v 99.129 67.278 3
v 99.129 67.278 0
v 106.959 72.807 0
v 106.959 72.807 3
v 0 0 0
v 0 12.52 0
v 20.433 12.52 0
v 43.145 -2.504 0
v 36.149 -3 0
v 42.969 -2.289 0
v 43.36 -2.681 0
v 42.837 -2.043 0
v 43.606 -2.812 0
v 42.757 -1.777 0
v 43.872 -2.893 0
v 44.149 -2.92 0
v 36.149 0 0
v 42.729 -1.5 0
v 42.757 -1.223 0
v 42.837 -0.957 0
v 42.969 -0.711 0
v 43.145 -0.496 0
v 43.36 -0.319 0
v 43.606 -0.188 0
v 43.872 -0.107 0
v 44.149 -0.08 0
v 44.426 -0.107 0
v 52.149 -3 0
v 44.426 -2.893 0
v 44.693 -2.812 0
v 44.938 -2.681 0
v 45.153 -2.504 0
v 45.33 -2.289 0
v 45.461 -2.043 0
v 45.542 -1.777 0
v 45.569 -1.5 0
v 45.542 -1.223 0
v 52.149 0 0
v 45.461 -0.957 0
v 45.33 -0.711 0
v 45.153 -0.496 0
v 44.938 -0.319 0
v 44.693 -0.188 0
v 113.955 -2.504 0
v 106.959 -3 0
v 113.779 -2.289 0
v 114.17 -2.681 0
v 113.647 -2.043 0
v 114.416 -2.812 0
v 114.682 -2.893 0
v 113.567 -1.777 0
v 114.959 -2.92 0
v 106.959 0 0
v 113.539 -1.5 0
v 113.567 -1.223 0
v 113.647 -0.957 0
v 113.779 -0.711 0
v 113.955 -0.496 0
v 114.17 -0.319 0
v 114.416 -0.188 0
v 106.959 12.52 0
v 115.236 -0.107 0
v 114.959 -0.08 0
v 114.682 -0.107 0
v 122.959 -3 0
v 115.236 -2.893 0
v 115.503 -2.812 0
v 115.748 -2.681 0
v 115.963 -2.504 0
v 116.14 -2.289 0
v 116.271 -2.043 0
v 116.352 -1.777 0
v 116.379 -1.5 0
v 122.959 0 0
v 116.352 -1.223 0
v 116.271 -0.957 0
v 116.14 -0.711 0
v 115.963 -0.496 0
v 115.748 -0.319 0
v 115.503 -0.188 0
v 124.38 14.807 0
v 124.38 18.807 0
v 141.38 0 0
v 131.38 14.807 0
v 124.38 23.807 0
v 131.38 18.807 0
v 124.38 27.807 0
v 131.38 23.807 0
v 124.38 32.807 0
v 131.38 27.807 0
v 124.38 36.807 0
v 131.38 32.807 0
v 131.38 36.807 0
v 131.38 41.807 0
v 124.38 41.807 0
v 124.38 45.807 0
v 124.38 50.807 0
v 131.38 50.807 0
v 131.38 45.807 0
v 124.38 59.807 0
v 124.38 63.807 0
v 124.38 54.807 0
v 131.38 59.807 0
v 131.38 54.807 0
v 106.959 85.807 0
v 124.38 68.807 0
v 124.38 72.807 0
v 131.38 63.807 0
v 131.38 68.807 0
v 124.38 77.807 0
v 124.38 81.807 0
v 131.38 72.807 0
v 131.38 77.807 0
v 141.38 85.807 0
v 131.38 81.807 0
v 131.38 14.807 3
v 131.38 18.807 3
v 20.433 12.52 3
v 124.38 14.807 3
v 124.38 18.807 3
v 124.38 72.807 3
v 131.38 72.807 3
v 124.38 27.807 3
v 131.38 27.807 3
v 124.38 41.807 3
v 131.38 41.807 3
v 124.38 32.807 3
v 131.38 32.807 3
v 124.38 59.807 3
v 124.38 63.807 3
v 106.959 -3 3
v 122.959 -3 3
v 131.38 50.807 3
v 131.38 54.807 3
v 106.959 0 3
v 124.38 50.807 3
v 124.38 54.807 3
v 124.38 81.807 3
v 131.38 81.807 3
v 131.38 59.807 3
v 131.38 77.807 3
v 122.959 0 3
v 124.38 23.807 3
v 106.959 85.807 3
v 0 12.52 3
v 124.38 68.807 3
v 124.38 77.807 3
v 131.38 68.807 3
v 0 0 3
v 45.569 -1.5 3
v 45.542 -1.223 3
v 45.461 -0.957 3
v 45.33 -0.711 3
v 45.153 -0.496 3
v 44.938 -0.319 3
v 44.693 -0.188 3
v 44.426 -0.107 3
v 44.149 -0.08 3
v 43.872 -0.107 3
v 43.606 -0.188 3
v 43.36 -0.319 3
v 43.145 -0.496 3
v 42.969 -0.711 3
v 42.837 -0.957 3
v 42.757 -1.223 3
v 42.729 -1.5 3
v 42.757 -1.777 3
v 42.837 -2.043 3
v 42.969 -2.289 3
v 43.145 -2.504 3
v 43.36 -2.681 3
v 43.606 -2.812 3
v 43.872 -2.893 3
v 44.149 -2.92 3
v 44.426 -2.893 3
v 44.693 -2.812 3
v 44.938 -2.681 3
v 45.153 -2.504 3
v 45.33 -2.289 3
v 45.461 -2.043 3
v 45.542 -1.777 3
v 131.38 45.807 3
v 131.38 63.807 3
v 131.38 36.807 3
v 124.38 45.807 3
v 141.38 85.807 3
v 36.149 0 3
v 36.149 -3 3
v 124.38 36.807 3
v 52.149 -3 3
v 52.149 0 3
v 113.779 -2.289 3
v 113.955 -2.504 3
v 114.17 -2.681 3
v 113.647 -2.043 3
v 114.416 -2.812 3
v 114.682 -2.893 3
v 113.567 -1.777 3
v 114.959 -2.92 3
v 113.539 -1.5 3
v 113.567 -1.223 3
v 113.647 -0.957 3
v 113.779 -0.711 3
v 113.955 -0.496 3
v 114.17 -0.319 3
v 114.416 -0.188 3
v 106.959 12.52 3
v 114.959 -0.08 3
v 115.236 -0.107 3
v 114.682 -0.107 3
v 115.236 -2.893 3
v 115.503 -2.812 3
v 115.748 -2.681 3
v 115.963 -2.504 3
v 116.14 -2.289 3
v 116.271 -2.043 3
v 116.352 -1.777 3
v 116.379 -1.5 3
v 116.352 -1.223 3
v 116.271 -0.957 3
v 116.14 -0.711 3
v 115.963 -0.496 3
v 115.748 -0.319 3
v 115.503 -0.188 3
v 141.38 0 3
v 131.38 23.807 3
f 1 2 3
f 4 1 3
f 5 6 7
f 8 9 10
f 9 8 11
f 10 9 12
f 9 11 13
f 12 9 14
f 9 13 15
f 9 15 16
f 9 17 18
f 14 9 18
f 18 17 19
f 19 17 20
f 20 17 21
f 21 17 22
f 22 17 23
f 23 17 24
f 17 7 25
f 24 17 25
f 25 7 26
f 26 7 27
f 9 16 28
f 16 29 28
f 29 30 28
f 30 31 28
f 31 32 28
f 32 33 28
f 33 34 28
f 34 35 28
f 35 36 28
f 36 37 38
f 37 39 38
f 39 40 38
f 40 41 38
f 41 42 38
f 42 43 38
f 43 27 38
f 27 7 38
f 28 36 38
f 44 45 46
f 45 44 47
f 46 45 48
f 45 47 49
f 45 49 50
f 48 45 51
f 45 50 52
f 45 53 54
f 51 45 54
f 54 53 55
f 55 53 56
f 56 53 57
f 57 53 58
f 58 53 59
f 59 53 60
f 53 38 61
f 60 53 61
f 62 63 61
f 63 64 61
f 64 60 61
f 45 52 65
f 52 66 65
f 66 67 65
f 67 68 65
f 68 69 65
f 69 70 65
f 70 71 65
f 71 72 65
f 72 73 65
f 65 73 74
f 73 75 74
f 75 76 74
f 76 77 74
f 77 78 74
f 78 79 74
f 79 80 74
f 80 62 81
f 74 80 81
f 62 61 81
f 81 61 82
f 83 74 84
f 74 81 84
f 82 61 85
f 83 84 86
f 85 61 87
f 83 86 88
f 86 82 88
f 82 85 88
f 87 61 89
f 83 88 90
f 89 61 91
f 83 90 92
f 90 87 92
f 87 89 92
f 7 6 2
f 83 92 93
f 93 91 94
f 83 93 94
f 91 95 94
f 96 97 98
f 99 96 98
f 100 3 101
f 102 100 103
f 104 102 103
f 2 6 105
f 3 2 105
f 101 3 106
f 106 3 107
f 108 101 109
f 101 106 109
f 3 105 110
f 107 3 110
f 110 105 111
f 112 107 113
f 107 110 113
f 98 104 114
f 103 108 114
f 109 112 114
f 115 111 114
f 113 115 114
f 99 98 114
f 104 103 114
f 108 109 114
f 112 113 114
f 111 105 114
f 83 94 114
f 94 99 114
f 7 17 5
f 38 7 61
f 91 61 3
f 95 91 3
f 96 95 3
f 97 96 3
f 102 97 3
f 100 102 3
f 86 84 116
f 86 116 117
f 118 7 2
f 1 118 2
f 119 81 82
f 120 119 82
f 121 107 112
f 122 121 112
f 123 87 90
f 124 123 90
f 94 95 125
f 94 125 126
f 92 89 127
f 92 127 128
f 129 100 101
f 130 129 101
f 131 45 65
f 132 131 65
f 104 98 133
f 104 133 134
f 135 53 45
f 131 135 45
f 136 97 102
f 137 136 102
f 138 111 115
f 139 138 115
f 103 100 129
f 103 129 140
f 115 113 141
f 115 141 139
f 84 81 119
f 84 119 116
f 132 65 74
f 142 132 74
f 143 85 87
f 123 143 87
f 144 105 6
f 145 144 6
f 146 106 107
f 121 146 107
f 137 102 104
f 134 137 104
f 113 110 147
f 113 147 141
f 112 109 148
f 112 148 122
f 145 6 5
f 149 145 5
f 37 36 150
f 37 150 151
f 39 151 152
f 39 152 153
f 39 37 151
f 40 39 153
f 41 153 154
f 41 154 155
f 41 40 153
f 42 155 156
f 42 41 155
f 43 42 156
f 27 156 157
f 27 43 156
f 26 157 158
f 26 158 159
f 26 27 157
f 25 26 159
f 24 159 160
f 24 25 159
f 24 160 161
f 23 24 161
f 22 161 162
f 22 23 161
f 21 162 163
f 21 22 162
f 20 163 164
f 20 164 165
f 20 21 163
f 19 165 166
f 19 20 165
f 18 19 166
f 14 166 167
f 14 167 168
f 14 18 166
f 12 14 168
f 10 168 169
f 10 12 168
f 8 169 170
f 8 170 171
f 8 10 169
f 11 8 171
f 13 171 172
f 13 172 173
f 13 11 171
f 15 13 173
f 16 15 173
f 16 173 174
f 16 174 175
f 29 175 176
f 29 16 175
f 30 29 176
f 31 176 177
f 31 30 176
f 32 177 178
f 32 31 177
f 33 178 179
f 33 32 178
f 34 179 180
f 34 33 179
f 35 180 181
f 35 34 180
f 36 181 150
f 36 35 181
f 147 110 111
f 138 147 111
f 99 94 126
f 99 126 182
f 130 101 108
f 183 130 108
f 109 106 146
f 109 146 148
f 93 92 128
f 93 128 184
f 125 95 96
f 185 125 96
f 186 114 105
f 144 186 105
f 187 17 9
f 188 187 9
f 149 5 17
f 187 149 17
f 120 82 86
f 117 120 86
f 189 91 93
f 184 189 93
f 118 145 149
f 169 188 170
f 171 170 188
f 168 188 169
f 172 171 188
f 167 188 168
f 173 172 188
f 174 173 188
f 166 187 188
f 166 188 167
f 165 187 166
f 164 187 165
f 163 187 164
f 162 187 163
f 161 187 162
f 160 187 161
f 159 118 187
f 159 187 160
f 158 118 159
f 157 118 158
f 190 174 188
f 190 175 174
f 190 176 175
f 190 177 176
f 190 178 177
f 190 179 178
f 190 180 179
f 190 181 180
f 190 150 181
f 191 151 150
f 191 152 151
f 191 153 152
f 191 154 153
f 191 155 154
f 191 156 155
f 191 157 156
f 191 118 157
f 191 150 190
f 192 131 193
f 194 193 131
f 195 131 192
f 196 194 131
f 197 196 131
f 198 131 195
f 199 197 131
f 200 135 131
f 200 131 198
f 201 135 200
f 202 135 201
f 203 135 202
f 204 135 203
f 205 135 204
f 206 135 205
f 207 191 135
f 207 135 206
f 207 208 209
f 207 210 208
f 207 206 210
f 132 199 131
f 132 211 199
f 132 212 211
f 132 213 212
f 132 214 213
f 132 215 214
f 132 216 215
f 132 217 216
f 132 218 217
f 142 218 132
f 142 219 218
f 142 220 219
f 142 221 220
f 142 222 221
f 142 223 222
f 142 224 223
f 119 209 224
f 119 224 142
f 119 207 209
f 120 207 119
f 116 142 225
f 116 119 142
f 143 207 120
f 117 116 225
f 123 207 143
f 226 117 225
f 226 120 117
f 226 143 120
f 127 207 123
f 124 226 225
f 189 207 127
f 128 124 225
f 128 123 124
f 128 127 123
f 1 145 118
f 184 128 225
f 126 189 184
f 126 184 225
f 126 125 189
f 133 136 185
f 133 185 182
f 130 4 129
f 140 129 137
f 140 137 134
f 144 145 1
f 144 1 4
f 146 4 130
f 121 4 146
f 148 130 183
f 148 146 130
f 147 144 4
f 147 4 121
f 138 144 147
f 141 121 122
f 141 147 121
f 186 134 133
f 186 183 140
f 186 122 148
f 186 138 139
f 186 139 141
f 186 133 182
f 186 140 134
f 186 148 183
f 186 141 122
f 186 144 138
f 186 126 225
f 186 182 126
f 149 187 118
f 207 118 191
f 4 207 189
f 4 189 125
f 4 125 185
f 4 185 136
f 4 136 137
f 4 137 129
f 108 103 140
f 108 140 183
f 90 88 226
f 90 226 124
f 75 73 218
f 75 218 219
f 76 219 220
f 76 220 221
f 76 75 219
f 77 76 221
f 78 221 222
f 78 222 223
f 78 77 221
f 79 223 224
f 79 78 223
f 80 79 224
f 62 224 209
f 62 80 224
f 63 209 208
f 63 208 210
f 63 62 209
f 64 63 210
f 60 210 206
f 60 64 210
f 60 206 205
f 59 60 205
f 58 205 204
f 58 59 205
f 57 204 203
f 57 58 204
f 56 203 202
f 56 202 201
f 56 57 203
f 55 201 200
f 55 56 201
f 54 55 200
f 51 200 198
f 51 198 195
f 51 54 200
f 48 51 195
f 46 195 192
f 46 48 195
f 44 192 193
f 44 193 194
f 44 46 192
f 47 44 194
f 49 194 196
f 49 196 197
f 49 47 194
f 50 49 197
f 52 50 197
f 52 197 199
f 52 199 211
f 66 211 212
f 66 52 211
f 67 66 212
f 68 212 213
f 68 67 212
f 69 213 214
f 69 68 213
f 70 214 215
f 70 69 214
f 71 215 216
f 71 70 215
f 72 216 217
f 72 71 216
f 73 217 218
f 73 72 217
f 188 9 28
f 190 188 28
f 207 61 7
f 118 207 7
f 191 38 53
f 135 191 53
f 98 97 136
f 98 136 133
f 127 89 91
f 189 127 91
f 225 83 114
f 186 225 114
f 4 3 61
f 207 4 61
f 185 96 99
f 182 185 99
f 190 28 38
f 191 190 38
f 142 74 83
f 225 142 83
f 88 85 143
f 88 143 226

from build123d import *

# Parameters (mm, degrees)
SKETCH1_R           = 1.42
SKETCH1_W           = 7
SKETCH1_H           = 4
BOSS_EXTRUDE2_DEPTH = 3


with BuildPart() as part:
    # Sketch1 → Boss-Extrude2 (new body)
    with BuildSketch(Plane.XY):
        Polygon((36.149381, 0), (36.149381, -3), (52.149381, -3), (52.149381, 0), (106.959381, 0), (106.959381, -3), (122.959381, -3), (122.959381, 0), (141.38, 0), (141.38, 27.105503225), (141.38, 85.806519795), (140.170833607, 85.806519795), (122.959381, 85.806519795), (106.959381, 85.806519795), (0, 12.520138185), (0, 0), align=None)
        with Locations((44.149381, -1.5)):
            Circle(SKETCH1_R, mode=Mode.SUBTRACT)
        with Locations((114.959381, -1.5)):
            Circle(SKETCH1_R, mode=Mode.SUBTRACT)
        Polygon((20.433228311, 12.520138185), (99.128706317, 67.278357703), (106.959381, 72.806519795), (106.959381, 12.520138185), (99.128706317, 12.520138185), align=None, mode=Mode.SUBTRACT)
        with Locations((127.88, 70.806519795)):
            Rectangle(SKETCH1_W, SKETCH1_H, mode=Mode.SUBTRACT)
        with Locations((127.88, 79.806519795)):
            Rectangle(SKETCH1_W, SKETCH1_H, mode=Mode.SUBTRACT)
        with Locations((127.88, 61.806519795)):
            Rectangle(SKETCH1_W, SKETCH1_H, mode=Mode.SUBTRACT)
        with Locations((127.88, 52.806519795)):
            Rectangle(SKETCH1_W, SKETCH1_H, mode=Mode.SUBTRACT)
        with Locations((127.88, 43.806519795)):
            Rectangle(SKETCH1_W, SKETCH1_H, mode=Mode.SUBTRACT)
        with Locations((127.88, 34.806519795)):
            Rectangle(SKETCH1_W, SKETCH1_H, mode=Mode.SUBTRACT)
        with Locations((127.88, 25.806519795)):
            Rectangle(SKETCH1_W, SKETCH1_H, mode=Mode.SUBTRACT)
        with Locations((127.88, 16.806519795)):
            Rectangle(SKETCH1_W, SKETCH1_H, mode=Mode.SUBTRACT)
    extrude(amount=BOSS_EXTRUDE2_DEPTH)


solid = part.part
